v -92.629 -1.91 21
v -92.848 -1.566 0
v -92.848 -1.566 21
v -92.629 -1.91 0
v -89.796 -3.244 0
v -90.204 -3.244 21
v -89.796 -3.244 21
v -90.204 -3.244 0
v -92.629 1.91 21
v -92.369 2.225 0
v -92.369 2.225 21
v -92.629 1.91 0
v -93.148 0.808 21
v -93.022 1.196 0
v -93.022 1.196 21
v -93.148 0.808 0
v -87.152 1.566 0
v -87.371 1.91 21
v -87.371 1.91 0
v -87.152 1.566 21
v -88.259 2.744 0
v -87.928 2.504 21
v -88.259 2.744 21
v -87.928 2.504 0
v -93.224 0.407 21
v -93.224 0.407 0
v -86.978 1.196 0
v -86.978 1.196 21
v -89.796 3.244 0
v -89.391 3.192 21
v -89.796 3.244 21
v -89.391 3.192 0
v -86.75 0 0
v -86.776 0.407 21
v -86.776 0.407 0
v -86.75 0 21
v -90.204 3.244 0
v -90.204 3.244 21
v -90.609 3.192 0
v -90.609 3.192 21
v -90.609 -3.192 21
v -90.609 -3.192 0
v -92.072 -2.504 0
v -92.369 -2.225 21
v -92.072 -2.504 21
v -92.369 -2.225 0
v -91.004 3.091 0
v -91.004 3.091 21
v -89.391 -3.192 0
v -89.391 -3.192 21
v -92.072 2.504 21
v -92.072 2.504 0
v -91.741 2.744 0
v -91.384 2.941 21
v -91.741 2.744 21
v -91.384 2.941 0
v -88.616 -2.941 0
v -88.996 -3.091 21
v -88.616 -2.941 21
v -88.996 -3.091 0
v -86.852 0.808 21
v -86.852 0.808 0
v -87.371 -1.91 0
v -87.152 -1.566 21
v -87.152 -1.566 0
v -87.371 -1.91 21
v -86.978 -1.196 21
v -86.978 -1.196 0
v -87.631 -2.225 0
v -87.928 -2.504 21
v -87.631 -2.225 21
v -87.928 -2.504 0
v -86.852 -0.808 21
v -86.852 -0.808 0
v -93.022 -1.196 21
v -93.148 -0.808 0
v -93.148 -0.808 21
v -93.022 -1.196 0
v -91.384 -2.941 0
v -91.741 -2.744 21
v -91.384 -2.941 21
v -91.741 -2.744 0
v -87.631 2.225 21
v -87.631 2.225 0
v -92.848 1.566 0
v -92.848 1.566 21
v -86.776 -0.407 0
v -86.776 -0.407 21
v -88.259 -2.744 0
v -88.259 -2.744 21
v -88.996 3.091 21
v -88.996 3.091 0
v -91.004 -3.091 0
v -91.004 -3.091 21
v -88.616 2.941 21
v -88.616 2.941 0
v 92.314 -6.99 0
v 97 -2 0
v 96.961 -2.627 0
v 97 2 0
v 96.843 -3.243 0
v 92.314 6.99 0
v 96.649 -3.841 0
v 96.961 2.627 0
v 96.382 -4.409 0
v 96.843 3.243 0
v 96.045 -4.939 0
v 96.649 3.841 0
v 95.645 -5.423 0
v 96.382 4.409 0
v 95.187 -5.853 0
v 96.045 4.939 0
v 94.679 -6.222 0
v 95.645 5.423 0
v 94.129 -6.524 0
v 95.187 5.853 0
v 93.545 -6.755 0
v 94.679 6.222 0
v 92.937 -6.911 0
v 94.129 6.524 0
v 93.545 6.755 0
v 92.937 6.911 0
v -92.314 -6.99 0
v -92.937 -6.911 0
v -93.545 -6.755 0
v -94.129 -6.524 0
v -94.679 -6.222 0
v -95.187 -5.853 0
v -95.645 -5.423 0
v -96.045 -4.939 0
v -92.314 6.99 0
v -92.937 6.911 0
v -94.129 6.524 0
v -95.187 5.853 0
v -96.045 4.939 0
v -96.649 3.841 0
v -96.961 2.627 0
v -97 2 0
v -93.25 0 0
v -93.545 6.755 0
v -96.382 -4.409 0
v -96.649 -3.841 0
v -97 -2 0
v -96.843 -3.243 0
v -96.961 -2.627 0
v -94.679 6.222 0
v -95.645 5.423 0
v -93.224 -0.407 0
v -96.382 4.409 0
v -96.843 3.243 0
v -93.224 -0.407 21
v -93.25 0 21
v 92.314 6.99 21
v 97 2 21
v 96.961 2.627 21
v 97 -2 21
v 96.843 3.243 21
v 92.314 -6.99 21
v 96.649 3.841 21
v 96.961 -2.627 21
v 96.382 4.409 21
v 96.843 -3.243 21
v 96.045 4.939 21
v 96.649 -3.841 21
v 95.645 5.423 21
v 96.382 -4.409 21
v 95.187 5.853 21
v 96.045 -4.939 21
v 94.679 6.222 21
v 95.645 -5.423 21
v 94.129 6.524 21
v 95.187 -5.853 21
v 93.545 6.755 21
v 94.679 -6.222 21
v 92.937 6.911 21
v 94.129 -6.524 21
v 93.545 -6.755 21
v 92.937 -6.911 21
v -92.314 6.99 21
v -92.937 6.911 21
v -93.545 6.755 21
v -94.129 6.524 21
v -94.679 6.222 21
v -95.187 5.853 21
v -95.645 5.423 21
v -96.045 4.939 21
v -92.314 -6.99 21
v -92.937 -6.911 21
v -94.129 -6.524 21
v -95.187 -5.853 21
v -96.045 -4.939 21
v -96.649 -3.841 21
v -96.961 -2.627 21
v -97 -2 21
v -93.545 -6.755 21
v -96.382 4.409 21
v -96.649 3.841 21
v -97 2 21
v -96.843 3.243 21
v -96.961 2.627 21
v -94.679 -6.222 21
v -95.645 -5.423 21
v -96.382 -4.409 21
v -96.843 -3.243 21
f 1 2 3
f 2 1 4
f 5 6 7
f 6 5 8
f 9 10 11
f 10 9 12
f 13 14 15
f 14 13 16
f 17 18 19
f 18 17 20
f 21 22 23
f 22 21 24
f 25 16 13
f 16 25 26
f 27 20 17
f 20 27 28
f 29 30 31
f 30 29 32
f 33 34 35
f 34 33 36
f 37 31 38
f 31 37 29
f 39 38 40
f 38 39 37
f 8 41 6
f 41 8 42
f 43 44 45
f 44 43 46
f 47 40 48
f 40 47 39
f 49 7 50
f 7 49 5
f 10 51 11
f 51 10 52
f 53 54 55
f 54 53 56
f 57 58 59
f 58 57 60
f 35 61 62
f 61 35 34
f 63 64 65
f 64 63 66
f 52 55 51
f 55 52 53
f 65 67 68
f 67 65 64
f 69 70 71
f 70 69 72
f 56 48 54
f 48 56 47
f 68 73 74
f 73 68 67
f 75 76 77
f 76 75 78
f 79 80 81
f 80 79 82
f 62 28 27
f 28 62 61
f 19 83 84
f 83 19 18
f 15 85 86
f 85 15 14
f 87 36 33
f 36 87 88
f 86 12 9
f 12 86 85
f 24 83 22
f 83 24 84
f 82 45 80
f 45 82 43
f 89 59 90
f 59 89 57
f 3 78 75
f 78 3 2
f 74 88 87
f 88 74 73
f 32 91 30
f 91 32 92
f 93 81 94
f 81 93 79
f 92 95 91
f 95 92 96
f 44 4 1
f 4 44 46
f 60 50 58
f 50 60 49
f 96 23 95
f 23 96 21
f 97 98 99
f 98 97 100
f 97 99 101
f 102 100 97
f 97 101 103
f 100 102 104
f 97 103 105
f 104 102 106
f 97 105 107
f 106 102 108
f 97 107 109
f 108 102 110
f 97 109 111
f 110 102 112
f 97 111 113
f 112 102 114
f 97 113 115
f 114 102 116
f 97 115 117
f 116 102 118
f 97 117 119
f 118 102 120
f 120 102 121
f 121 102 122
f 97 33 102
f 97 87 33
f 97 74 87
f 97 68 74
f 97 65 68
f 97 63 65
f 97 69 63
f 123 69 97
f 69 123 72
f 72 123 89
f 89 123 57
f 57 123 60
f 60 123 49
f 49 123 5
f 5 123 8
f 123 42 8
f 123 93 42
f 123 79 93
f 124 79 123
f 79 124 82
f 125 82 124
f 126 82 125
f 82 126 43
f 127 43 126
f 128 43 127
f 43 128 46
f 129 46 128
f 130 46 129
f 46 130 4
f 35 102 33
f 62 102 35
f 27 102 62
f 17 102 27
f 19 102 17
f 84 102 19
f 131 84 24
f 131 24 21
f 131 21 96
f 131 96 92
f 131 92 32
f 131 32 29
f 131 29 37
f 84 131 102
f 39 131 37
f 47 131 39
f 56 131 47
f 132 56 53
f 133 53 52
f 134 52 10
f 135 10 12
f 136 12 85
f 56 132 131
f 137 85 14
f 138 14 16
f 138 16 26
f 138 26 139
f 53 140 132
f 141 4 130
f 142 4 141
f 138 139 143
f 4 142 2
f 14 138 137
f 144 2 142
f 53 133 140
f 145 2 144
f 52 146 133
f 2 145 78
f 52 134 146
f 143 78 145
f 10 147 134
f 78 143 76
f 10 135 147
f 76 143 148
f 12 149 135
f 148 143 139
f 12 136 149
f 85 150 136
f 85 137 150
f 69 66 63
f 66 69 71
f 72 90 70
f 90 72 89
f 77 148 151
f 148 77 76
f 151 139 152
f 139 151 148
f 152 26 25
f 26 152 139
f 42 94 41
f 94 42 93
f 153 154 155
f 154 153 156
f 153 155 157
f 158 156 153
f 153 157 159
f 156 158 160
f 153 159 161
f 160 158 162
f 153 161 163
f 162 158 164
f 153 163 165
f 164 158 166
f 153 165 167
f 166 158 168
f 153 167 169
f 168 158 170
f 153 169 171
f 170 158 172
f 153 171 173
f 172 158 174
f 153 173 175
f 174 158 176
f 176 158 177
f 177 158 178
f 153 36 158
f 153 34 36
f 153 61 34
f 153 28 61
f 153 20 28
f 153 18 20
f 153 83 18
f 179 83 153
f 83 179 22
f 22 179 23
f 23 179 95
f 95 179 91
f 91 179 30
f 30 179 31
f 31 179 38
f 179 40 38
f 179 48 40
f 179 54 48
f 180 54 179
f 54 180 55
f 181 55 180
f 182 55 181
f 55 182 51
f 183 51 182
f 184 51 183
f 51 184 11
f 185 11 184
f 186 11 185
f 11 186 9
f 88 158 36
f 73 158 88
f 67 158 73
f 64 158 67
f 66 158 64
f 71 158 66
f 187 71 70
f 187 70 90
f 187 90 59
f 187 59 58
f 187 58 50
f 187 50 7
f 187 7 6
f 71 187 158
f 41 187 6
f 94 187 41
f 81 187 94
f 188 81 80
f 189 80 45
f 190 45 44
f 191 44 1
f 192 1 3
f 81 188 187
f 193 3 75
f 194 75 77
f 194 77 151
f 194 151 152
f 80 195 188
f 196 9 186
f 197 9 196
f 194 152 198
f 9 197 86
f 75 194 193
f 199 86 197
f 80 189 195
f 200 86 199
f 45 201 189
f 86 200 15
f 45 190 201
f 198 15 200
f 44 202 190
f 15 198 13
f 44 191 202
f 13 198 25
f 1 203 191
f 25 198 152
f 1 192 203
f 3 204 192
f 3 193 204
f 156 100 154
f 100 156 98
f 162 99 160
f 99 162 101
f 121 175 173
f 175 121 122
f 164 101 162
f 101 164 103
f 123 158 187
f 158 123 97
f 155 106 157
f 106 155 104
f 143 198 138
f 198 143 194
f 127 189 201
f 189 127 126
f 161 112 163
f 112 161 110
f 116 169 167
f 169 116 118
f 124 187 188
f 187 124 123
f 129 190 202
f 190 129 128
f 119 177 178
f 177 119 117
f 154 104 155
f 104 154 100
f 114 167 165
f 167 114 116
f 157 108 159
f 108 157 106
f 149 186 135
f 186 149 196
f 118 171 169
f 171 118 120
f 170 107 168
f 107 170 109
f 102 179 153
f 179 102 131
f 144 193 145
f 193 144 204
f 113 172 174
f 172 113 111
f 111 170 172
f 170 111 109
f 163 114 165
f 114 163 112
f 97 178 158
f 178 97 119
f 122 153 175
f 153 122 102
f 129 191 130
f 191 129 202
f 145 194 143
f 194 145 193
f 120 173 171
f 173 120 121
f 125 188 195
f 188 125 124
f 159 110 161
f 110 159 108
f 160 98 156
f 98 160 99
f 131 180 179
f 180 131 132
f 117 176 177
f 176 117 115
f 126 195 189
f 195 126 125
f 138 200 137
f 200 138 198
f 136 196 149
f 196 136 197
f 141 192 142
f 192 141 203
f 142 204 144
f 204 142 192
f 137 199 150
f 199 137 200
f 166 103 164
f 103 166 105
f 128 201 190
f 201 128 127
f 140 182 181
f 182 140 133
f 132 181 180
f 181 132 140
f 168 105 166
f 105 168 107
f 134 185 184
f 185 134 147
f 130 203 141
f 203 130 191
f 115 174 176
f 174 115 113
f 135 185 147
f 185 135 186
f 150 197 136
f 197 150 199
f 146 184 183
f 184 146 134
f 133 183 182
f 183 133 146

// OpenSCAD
$fn = 50;


difference() {
	union() {
		hull() {
			translate(v = [-92.0000000000, 2.0000000000, 0]) {
				cylinder(h = 21, r = 5);
			}
			translate(v = [92.0000000000, 2.0000000000, 0]) {
				cylinder(h = 21, r = 5);
			}
			translate(v = [-92.0000000000, -2.0000000000, 0]) {
				cylinder(h = 21, r = 5);
			}
			translate(v = [92.0000000000, -2.0000000000, 0]) {
				cylinder(h = 21, r = 5);
			}
		}
	}
	union() {
		translate(v = [-90.0000000000, 0.0000000000, 0]) {
			cylinder(h = 21, r = 3.2500000000);
		}
		translate(v = [-90.0000000000, 0.0000000000, 0]) {
			cylinder(h = 21, r = 1.8000000000);
		}
		translate(v = [-90.0000000000, 0.0000000000, 0]) {
			cylinder(h = 21, r = 1.8000000000);
		}
		translate(v = [-90.0000000000, 0.0000000000, 0]) {
			cylinder(h = 21, r = 1.8000000000);
		}
	}
}
